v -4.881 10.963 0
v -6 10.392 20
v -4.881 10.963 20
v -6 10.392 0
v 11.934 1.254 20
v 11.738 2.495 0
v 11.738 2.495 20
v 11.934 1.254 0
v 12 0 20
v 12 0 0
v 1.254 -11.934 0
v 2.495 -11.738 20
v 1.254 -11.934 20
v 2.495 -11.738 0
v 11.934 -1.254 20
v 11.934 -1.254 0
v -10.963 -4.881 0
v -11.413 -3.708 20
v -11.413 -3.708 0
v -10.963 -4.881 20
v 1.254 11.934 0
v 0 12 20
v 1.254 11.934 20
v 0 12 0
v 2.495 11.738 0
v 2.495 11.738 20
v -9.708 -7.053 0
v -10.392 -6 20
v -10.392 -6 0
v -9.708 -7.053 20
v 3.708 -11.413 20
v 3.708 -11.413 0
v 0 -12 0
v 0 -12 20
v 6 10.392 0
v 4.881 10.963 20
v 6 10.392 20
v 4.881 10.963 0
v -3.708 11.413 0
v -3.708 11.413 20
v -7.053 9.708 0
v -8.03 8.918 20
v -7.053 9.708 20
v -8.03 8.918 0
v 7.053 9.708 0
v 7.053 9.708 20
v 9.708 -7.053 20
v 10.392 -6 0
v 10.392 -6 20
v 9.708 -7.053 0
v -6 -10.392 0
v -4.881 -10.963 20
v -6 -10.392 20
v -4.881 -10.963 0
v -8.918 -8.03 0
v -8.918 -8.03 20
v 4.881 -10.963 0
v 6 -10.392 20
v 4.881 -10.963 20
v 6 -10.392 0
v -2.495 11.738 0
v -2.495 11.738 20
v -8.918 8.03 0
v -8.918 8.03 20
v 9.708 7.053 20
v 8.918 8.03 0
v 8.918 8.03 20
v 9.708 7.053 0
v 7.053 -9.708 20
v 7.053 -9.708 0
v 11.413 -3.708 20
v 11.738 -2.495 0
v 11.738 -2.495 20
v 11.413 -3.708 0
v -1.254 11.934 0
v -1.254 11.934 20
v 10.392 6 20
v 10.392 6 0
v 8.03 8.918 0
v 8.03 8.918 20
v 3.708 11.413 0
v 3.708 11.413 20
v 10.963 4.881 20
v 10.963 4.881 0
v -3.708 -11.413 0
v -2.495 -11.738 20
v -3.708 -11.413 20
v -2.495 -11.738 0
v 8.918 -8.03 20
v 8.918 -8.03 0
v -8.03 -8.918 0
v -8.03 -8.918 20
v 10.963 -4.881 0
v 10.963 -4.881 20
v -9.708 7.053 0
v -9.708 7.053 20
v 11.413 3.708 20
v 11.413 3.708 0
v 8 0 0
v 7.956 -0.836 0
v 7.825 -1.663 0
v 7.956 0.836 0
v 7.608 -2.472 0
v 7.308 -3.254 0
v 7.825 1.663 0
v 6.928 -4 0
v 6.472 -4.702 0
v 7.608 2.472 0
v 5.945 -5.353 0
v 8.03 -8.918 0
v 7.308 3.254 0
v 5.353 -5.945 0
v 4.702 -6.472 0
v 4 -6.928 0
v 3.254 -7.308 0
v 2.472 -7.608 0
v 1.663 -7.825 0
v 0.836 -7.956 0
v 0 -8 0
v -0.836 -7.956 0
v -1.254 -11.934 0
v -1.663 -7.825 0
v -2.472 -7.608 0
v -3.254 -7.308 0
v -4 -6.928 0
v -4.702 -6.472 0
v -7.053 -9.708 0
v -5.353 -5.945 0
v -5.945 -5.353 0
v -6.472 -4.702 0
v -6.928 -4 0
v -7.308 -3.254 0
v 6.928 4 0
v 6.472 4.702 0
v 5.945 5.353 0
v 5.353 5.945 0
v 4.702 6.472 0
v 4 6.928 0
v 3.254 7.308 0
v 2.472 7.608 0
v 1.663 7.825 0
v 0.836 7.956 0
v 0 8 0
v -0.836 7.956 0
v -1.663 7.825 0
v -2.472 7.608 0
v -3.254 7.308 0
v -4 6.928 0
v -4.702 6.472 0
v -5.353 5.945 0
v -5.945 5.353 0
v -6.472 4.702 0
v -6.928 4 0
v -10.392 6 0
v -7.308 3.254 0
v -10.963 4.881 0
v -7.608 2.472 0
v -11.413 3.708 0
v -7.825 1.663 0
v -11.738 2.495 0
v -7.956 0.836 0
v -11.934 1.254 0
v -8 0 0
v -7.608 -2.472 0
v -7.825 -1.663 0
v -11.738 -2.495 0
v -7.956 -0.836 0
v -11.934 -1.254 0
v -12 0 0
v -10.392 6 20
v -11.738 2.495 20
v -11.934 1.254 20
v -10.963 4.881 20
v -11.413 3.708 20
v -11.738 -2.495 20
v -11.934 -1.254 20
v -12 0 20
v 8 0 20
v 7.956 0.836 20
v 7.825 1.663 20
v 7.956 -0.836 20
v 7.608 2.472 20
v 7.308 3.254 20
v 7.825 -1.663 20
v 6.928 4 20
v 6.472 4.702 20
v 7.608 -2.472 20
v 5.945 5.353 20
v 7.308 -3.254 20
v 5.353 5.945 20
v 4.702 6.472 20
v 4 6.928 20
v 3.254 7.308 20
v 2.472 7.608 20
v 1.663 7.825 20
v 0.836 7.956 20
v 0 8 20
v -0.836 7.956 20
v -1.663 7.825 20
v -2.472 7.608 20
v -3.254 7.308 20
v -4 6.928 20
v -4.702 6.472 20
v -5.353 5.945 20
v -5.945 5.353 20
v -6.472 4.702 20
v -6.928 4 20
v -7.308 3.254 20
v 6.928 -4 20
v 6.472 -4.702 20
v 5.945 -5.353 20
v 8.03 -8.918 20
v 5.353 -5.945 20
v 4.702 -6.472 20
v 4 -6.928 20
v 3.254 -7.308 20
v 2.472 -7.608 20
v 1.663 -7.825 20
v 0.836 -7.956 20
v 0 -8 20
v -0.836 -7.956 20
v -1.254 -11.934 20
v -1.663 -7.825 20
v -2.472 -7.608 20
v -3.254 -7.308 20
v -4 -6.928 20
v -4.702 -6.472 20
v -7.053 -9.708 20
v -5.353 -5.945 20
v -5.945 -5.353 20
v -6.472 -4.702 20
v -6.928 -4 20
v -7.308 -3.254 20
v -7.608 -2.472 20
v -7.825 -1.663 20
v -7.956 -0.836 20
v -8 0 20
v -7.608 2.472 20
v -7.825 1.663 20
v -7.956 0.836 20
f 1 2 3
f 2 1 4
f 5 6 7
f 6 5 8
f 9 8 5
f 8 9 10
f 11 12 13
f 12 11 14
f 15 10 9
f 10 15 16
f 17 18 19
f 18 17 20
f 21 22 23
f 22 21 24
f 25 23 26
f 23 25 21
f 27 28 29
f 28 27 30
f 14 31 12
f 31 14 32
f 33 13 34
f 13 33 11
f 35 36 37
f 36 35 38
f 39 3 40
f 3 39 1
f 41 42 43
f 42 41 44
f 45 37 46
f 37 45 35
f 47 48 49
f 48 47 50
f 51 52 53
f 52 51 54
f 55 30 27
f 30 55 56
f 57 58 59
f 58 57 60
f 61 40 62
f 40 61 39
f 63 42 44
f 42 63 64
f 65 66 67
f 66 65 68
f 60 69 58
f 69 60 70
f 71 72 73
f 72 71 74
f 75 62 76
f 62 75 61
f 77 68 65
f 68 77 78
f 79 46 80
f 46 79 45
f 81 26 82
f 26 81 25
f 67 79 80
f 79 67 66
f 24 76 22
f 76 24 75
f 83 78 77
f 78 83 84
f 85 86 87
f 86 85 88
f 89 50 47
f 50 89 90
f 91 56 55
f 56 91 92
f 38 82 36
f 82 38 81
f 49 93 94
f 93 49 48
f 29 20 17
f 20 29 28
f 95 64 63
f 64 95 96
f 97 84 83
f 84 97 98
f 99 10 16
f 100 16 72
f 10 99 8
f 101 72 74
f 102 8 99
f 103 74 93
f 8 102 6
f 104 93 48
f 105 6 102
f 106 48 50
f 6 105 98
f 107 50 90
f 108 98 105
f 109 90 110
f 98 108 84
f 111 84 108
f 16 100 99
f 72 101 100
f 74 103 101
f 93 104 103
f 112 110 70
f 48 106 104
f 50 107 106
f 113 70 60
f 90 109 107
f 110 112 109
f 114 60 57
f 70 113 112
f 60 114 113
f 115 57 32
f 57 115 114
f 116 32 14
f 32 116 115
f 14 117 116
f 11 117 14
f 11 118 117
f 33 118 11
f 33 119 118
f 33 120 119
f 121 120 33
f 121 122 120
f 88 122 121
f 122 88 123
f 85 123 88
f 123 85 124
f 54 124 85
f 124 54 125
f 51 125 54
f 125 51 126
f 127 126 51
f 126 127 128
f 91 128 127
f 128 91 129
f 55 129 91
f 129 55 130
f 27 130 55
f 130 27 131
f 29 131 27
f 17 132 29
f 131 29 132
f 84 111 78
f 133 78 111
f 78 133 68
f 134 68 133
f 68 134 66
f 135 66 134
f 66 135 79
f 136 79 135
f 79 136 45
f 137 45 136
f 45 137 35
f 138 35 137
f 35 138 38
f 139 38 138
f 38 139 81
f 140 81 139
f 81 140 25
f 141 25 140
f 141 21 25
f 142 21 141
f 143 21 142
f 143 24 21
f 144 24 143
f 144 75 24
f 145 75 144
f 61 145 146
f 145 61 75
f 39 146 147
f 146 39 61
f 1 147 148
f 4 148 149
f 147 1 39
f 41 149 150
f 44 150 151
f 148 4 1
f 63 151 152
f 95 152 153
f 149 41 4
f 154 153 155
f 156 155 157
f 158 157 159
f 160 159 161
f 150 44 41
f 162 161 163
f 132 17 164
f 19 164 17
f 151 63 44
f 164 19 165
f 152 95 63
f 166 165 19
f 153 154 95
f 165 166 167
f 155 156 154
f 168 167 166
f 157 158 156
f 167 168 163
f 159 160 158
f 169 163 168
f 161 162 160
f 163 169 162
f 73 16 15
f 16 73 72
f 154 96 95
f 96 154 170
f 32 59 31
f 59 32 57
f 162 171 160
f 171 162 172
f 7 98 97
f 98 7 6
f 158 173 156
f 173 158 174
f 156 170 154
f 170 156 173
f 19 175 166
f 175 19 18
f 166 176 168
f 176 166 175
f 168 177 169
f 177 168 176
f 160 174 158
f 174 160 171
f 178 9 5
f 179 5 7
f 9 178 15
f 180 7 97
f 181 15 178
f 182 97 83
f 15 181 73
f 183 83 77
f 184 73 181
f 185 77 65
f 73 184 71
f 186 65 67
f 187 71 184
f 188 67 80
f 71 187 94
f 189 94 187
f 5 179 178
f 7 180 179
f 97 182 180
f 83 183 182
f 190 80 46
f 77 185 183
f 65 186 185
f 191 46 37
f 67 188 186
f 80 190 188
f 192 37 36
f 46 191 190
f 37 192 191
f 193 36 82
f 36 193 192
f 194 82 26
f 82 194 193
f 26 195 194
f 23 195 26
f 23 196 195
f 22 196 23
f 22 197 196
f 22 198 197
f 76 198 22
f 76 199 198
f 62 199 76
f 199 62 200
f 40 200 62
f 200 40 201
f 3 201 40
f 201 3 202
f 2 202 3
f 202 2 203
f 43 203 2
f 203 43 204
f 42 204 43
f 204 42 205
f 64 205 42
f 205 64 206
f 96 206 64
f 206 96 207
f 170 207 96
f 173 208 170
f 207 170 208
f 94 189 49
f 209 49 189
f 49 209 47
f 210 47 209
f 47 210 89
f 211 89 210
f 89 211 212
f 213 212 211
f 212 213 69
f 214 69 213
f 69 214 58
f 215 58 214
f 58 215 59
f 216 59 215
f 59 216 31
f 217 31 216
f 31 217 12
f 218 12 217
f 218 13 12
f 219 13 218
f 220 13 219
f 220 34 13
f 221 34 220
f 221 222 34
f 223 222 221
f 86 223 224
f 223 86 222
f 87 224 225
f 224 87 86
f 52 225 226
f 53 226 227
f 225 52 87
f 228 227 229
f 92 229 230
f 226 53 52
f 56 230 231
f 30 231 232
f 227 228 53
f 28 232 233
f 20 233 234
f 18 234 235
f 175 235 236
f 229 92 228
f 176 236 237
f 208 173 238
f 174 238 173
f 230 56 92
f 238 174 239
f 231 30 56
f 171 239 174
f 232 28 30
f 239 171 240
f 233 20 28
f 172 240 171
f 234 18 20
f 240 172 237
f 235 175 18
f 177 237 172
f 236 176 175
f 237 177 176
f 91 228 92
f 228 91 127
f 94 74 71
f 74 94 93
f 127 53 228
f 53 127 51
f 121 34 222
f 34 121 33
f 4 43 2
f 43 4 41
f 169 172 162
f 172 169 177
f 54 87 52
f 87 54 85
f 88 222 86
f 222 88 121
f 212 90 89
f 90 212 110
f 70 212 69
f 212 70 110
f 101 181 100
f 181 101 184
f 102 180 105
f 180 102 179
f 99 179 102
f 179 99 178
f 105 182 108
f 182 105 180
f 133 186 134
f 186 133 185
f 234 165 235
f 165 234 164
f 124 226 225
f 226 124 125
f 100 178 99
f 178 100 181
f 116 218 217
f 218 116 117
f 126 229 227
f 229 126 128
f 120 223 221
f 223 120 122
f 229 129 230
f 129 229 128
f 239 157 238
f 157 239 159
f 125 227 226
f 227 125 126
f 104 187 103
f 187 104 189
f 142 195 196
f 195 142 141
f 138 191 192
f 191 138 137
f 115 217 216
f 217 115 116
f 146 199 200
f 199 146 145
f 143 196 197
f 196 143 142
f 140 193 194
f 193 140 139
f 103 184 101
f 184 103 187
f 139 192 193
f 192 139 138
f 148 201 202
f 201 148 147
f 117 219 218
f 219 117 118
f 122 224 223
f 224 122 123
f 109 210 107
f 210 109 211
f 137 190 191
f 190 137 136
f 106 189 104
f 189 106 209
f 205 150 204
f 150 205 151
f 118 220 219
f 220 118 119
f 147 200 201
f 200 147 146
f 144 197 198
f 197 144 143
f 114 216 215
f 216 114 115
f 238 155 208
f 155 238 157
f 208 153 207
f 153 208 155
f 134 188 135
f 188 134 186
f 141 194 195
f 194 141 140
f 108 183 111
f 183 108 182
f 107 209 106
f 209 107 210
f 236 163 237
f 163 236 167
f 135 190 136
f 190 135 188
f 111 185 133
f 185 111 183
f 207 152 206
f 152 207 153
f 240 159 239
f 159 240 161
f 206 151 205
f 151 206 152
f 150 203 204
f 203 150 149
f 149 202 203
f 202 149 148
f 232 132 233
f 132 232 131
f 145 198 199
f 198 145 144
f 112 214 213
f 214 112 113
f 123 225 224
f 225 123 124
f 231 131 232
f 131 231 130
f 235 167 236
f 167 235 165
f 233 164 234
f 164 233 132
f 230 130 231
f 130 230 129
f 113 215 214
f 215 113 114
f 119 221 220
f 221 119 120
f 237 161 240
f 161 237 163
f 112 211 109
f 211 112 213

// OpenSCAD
// Axle spacer tube.
$fn = 60;
eps = 0.02;
inner_d = 16;
outer_d = 24;
length = 20;
difference() { cylinder(d = outer_d, h = length); translate([0,0,-eps]) cylinder(d = inner_d, h = length + 2 * eps); }
